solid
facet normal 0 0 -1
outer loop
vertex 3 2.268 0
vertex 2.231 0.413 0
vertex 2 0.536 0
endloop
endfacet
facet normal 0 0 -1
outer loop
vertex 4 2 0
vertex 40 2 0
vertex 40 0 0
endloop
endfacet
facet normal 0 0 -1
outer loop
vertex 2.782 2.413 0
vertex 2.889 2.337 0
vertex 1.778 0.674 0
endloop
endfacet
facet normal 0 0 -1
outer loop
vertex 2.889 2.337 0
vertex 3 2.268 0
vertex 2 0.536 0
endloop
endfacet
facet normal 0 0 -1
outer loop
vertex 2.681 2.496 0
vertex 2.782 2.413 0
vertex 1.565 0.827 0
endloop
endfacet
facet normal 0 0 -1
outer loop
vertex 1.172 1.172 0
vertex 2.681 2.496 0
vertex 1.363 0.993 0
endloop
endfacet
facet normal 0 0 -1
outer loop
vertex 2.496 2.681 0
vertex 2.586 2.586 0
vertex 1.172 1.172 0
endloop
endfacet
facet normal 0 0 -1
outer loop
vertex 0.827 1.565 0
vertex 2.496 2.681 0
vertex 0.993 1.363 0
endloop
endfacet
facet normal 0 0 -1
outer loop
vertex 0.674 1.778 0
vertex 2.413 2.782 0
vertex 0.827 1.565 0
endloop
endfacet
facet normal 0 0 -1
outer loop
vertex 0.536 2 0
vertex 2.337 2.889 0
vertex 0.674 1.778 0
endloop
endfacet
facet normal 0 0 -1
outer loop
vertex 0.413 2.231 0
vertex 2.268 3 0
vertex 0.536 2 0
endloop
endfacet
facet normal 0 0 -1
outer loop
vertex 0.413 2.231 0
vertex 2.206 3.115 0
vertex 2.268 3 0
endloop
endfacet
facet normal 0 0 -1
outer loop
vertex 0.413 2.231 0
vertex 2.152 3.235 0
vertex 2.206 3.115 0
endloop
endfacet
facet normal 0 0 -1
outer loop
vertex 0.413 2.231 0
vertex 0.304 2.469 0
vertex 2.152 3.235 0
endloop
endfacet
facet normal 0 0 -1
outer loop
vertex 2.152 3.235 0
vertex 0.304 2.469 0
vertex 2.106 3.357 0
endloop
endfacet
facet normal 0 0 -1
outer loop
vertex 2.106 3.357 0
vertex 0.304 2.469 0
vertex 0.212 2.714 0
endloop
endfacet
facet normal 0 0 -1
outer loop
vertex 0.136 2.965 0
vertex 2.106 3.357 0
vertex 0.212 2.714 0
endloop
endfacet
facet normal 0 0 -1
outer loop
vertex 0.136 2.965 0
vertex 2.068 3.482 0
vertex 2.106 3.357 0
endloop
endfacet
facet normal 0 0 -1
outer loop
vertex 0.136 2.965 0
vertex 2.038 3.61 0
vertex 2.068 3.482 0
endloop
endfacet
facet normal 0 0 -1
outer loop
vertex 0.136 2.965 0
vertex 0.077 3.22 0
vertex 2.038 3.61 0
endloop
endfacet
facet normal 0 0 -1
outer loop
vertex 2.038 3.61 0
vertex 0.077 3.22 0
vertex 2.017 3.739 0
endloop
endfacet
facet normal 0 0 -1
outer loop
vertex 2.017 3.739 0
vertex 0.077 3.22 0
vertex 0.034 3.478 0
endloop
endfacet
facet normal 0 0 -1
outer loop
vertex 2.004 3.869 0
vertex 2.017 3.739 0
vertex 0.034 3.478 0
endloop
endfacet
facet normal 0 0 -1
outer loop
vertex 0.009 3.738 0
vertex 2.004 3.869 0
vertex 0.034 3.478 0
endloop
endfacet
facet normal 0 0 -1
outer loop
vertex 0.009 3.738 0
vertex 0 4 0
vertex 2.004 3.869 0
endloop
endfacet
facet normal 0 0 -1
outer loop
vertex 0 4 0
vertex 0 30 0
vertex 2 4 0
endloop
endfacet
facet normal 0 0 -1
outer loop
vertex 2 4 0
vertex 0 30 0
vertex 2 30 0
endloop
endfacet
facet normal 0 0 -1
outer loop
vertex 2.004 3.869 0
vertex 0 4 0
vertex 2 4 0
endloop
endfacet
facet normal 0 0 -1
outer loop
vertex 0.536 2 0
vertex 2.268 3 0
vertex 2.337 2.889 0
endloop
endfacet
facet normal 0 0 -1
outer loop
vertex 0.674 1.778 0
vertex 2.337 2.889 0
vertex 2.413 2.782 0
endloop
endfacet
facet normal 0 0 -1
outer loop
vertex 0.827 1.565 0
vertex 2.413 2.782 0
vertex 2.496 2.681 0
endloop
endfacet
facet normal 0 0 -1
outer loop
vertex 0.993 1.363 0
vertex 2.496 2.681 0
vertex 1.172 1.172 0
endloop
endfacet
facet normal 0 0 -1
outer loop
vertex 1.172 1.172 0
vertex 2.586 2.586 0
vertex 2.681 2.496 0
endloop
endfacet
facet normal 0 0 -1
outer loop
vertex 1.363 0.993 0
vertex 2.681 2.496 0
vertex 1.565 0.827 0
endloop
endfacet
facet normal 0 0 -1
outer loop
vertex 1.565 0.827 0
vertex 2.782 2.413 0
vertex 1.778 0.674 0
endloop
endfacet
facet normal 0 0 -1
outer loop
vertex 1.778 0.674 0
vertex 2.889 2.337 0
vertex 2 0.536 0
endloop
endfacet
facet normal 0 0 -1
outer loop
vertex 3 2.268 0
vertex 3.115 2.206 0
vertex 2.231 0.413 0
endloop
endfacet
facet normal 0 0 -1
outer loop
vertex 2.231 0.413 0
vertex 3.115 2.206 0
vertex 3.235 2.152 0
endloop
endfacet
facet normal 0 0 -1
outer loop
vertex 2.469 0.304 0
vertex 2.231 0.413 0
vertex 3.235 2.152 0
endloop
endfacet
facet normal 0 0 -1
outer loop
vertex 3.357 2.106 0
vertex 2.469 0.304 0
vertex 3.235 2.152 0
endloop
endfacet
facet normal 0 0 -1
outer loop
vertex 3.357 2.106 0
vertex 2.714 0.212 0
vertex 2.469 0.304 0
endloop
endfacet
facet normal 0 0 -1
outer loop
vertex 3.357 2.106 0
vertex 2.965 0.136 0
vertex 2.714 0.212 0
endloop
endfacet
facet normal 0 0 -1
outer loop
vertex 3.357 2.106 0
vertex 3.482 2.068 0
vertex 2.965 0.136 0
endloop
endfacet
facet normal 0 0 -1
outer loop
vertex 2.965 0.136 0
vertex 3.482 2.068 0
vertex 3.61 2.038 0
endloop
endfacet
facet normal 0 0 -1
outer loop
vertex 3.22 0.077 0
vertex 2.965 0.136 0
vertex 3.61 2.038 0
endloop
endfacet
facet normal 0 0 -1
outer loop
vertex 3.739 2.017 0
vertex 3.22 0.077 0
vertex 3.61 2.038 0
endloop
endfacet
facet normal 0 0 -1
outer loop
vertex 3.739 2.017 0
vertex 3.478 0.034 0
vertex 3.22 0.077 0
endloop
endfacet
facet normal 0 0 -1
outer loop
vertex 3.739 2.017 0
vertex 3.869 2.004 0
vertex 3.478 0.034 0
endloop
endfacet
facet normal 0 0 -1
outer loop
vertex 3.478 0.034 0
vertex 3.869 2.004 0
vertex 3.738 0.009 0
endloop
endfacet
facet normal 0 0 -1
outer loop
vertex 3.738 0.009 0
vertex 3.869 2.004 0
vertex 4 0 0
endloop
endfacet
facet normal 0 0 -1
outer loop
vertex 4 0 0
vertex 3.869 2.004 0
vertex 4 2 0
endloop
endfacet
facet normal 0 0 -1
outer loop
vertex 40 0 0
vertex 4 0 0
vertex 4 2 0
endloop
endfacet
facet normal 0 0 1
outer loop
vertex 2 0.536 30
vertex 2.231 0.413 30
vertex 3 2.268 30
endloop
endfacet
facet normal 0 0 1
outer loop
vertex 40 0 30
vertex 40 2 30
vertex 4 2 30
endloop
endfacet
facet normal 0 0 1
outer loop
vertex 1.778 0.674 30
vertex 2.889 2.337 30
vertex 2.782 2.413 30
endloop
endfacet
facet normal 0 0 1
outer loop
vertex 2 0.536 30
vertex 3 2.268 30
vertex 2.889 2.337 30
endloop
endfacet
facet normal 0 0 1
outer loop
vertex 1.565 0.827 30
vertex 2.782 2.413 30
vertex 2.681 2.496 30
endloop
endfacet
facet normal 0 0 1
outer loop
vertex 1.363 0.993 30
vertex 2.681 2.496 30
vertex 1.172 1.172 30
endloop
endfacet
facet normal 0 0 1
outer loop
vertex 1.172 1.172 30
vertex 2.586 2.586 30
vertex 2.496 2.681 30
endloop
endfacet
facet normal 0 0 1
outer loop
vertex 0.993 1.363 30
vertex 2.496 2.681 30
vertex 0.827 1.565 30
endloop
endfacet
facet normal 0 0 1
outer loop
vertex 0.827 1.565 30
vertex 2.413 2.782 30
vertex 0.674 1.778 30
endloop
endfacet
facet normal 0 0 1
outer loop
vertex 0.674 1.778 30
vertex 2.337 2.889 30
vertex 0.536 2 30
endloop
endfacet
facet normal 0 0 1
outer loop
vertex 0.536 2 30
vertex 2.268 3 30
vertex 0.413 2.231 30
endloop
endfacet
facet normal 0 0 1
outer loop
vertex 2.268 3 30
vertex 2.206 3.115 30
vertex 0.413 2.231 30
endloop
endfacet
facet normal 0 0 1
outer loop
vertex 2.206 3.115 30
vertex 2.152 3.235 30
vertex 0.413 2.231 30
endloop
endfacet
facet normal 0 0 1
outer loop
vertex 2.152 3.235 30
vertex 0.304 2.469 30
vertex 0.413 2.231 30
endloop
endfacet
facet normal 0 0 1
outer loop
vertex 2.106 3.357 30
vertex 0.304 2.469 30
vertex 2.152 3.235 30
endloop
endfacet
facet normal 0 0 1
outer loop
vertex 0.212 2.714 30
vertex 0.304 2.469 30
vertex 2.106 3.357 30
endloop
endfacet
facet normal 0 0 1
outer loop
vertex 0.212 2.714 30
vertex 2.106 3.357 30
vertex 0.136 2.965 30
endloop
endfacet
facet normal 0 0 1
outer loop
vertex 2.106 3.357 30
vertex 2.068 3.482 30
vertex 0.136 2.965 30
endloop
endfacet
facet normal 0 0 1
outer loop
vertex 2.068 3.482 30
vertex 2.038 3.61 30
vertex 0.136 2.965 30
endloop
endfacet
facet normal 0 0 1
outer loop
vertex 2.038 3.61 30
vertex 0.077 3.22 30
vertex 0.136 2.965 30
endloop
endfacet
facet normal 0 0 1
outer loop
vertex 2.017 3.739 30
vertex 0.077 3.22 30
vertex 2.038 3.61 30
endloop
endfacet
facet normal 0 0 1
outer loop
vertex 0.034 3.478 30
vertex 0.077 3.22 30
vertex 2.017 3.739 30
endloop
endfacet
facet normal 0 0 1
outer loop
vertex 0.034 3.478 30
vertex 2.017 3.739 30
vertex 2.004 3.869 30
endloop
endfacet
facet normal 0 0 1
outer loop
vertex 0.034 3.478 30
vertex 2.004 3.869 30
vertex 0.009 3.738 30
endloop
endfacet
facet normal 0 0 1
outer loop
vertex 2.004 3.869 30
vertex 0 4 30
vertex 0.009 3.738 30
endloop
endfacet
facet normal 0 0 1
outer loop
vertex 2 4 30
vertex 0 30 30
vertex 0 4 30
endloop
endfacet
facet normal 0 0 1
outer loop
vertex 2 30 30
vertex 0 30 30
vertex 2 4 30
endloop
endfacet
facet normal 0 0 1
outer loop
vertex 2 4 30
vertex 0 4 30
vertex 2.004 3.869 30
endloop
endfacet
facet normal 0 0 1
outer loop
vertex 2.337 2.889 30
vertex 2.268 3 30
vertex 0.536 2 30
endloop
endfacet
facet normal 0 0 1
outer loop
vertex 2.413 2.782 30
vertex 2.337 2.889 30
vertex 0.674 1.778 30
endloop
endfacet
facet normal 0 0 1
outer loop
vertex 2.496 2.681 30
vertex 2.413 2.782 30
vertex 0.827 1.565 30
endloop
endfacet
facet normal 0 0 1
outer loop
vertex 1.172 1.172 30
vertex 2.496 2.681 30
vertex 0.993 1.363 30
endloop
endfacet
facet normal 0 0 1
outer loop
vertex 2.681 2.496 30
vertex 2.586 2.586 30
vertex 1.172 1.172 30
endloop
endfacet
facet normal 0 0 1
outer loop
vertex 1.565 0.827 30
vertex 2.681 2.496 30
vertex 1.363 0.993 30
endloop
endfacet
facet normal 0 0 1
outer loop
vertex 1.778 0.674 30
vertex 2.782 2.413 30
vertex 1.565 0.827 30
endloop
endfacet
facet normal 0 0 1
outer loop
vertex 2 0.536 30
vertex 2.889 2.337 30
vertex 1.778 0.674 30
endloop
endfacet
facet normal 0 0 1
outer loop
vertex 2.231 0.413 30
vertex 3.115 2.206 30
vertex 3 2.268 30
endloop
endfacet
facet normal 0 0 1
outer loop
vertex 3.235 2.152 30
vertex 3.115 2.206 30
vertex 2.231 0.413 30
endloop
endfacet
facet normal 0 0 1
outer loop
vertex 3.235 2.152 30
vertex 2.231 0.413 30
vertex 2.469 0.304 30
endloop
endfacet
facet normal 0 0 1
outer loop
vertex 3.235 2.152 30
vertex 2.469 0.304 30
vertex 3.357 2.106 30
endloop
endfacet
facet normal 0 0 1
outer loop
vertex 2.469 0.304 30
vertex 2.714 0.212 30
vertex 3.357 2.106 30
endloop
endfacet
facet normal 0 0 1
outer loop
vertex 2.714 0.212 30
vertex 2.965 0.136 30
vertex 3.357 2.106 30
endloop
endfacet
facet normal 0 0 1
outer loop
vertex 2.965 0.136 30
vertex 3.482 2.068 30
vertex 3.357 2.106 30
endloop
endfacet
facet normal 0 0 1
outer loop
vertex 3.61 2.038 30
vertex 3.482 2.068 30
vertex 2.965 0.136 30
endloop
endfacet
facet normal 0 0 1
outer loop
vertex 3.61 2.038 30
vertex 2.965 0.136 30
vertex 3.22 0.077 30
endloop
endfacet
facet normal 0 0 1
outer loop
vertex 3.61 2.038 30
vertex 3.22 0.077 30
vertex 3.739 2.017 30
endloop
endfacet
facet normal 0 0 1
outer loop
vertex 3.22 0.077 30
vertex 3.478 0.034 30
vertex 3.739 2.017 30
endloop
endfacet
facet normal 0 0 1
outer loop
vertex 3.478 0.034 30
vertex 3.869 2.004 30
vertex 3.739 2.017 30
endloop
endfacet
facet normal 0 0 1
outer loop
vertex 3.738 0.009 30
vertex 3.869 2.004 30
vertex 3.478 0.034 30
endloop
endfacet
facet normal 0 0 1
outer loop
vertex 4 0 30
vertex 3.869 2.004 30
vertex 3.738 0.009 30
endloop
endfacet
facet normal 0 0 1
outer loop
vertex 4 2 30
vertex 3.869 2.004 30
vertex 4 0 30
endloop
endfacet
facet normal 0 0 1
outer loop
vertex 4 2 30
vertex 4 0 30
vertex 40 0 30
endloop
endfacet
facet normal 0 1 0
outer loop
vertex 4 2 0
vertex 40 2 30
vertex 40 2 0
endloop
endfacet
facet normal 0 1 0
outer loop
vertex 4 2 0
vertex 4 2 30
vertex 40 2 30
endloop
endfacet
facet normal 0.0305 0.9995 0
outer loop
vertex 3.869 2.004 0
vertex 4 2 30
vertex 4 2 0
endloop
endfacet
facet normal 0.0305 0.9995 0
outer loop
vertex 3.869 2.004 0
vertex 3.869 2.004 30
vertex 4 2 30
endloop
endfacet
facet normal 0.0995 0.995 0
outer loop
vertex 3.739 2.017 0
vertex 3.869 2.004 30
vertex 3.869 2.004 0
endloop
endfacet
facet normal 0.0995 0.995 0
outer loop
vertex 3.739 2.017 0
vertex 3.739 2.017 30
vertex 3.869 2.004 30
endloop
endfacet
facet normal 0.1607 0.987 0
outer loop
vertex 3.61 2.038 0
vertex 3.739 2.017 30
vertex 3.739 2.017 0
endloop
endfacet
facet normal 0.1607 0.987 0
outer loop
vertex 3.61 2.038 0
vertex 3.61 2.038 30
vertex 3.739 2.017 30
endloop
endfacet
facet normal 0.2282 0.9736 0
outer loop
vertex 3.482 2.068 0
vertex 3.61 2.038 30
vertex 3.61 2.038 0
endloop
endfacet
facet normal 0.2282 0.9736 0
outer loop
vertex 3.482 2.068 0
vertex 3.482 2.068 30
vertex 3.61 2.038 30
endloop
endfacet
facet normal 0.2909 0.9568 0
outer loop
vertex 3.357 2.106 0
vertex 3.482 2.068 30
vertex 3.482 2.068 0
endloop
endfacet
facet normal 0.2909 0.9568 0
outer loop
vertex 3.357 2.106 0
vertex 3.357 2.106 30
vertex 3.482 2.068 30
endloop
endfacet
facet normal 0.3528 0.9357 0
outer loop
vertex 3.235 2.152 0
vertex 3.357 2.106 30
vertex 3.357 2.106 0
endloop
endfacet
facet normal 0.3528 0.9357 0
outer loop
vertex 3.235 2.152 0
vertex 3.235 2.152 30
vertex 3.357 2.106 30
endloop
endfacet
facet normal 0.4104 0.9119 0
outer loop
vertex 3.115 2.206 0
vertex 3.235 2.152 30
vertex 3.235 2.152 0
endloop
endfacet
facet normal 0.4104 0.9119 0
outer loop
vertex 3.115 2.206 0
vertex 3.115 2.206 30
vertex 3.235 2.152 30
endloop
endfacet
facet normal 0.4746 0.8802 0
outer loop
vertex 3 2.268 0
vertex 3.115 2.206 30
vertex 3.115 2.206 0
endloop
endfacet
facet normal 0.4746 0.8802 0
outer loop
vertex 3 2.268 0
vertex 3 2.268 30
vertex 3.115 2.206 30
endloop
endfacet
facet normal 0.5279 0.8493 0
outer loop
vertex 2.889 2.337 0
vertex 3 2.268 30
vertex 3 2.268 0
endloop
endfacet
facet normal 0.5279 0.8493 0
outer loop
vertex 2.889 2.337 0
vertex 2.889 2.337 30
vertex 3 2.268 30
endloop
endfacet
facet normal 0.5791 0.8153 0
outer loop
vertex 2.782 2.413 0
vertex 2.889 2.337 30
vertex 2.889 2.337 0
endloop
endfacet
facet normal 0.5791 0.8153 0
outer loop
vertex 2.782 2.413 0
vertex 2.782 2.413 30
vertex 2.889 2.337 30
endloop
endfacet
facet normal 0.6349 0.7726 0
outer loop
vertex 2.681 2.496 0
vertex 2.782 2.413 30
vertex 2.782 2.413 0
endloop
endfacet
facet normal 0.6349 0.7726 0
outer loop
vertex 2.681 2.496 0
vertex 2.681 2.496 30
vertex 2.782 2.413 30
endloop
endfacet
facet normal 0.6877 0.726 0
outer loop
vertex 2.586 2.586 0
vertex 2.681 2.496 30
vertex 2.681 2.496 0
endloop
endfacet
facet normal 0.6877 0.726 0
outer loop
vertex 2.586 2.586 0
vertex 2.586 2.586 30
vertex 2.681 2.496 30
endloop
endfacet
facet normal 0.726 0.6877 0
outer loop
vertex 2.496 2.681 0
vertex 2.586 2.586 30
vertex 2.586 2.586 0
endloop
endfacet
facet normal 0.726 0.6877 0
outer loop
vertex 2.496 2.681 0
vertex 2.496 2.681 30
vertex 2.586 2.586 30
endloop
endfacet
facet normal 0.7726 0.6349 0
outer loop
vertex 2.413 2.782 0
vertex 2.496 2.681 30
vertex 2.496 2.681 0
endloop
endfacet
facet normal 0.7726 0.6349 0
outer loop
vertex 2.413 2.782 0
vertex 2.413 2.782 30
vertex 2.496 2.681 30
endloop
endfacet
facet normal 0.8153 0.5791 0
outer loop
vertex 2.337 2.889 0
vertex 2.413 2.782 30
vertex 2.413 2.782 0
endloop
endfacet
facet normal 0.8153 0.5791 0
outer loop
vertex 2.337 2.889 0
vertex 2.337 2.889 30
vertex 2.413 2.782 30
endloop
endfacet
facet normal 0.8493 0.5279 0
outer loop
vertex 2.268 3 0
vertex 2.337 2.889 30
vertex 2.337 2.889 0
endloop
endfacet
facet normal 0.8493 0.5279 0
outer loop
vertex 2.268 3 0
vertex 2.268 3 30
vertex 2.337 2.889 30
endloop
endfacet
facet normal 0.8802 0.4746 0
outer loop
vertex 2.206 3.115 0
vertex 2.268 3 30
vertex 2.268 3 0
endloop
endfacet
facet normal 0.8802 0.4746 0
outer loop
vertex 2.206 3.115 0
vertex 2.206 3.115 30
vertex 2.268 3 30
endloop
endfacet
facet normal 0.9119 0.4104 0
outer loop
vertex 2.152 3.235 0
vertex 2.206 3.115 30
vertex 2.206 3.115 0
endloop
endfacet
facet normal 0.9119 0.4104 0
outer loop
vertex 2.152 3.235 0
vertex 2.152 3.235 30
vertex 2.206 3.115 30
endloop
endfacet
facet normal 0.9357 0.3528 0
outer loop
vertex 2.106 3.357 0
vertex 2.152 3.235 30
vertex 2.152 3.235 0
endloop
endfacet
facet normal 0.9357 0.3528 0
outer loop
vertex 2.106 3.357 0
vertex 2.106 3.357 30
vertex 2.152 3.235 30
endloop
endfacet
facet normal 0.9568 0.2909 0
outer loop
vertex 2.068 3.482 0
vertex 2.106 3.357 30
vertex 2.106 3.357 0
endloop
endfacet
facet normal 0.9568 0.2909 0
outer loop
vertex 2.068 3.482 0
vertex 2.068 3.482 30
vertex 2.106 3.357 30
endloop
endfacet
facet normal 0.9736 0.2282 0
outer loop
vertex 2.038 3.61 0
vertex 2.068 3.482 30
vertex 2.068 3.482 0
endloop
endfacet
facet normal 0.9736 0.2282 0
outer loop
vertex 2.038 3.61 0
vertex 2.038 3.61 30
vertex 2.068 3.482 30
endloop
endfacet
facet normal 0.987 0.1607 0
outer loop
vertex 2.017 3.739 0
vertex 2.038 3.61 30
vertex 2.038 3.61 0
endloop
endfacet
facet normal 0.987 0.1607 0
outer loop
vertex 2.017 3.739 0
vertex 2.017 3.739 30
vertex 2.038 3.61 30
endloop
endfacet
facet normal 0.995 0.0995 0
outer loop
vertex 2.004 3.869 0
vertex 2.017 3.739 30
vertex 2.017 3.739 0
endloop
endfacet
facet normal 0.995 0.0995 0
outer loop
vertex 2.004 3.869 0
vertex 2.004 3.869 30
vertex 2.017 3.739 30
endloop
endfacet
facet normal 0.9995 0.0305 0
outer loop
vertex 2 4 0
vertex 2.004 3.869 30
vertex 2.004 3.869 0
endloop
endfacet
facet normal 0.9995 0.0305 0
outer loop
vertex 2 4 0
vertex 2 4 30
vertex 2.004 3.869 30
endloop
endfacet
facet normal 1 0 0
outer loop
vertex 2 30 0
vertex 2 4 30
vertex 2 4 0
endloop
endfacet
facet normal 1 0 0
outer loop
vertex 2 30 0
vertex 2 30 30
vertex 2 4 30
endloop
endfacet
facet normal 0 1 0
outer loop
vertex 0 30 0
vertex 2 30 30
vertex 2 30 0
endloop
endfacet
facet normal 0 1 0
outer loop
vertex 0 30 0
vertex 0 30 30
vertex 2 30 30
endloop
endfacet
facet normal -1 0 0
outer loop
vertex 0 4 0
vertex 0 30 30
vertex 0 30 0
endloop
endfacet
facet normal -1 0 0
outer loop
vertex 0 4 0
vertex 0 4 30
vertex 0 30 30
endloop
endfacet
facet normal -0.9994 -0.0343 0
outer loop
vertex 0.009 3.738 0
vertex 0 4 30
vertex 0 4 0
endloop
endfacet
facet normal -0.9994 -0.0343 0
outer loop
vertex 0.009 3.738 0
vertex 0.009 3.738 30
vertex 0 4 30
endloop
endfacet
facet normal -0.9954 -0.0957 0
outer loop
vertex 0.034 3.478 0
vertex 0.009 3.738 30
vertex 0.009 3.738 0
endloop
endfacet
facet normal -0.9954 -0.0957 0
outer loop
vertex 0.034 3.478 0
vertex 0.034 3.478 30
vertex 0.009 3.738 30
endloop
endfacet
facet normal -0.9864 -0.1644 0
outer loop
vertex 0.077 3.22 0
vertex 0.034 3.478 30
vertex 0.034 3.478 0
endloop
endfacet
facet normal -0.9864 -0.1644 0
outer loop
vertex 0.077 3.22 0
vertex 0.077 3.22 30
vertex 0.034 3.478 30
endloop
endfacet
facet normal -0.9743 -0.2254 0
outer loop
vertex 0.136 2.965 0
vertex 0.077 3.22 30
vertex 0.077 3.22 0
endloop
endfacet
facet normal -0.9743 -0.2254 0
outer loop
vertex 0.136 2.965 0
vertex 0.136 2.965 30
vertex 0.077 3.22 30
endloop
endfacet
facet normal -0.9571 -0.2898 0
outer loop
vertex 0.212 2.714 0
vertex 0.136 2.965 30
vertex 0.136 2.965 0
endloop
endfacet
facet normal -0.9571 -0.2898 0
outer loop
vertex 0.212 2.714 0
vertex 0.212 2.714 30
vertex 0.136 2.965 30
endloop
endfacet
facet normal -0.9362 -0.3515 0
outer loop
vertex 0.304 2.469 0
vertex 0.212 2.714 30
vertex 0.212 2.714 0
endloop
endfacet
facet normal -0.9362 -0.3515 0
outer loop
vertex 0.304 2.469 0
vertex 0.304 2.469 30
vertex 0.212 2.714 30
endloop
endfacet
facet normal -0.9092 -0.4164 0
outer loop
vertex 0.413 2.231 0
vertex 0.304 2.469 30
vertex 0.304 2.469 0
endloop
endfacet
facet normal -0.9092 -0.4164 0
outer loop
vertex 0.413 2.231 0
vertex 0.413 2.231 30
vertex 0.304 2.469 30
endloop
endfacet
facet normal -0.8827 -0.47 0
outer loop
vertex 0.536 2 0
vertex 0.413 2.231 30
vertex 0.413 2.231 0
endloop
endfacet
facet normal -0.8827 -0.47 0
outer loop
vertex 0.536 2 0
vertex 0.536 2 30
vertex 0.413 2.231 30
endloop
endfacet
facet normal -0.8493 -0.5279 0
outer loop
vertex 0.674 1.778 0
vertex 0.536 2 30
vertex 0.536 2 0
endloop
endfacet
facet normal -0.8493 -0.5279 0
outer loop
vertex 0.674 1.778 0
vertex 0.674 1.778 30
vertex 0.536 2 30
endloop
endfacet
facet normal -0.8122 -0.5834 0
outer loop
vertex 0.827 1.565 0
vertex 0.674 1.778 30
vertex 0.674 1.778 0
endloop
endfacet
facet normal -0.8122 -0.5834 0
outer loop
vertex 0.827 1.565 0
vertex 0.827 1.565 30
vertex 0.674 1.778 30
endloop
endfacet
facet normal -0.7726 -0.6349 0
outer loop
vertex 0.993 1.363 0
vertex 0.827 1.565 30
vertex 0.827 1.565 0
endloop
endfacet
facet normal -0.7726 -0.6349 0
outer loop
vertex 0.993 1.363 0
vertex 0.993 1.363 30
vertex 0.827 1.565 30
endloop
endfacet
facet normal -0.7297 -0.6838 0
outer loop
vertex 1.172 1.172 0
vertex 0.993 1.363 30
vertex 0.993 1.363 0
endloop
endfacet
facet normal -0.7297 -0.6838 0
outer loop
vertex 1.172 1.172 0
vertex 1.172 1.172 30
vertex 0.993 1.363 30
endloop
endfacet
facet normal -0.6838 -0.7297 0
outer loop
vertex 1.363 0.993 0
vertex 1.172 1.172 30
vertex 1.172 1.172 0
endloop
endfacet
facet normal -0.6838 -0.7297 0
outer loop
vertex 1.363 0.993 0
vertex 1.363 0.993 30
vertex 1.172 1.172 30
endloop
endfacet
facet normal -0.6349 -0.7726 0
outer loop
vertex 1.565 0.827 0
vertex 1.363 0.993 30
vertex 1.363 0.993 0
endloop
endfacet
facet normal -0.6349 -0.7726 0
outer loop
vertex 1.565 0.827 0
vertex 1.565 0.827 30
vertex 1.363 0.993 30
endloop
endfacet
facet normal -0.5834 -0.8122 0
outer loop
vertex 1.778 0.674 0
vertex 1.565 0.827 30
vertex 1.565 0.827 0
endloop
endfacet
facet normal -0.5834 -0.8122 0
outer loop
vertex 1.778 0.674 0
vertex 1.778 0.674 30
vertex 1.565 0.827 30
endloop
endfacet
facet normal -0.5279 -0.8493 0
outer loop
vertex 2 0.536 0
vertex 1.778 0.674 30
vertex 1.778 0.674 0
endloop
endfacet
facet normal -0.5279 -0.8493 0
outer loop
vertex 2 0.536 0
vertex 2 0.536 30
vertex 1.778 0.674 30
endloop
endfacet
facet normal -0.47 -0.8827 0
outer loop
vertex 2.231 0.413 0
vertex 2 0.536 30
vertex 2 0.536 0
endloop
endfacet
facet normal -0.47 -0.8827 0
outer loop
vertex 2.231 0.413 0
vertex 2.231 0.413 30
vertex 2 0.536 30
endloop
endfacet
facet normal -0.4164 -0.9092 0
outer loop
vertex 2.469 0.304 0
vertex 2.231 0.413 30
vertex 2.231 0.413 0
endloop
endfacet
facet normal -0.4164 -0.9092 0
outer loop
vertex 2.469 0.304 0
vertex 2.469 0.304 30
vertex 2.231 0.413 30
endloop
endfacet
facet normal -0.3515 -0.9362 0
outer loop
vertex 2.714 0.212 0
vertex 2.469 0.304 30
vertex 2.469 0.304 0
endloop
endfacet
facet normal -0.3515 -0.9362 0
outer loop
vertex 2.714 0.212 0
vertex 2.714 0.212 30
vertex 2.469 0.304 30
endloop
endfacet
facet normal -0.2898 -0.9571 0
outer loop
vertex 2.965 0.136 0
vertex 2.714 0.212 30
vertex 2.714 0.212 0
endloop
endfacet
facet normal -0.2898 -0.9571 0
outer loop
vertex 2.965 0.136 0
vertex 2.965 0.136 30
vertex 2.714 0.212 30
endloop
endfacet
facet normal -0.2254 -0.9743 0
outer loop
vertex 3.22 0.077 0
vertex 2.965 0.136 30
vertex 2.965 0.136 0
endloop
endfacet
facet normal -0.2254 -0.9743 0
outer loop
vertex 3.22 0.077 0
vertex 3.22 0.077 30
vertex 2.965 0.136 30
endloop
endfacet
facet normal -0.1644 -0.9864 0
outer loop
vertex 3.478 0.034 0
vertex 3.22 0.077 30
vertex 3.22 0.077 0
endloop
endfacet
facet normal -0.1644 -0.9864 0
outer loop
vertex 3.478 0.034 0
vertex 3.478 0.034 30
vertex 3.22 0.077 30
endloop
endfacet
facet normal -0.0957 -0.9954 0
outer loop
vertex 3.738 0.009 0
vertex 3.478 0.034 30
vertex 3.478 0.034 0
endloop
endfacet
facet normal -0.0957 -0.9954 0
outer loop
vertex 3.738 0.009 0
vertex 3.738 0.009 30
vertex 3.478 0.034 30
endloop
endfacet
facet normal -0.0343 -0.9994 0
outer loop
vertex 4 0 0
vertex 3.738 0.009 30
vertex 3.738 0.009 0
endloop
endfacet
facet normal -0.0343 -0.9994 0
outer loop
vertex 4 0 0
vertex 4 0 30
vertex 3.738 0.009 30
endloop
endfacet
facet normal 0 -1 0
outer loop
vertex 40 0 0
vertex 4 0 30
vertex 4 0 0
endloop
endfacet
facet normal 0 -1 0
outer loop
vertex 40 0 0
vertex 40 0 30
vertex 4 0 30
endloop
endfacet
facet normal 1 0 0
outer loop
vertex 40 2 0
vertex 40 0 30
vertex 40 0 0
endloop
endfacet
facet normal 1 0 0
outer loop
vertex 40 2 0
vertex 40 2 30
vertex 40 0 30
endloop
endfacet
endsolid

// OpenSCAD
thickness_mm = 2.0;
bend_radius_mm = 2.0;
k_factor = 0.45;
bend_angle_deg = 90;
flange_a_outside_mm = 40.0;
flange_b_outside_mm = 30.0;
bracket_width_mm = 30.0;

outer_radius_mm = bend_radius_mm + thickness_mm;
bend_allowance_mm = (bend_angle_deg * PI / 180) * (bend_radius_mm + k_factor * thickness_mm);
outside_setback_mm = outer_radius_mm * tan(bend_angle_deg / 2);
bend_deduction_mm = 2 * outside_setback_mm - bend_allowance_mm;
flat_length_mm = flange_a_outside_mm + flange_b_outside_mm - bend_deduction_mm;

echo(str(
    "MAKERBENCH-SHEETMETAL: {\"thickness_mm\": ",
    thickness_mm,
    ", \"bend_radius_mm\": ",
    bend_radius_mm,
    ", \"flat_length_mm\": ",
    flat_length_mm,
    "}"
));

$fn = 64;

function arc_points(cx, cy, r, a0, a1, n) =
    [for (i = [0:n])
        let(a = a0 + (a1 - a0) * i / n)
        [cx + r * cos(a), cy + r * sin(a)]
    ];

module sheet_metal_l_bracket() {
    cx = outer_radius_mm;
    cy = outer_radius_mm;
    arc_segments = 24;

    outer_arc = arc_points(cx, cy, outer_radius_mm, -90, -180, arc_segments);
    inner_arc = arc_points(cx, cy, bend_radius_mm, 180, 270, arc_segments);

    cross_section = concat(
        [[flange_a_outside_mm, 0]],
        outer_arc,
        [[0, flange_b_outside_mm],
         [thickness_mm, flange_b_outside_mm],
         [thickness_mm, outer_radius_mm]],
        inner_arc,
        [[flange_a_outside_mm, thickness_mm]]
    );

    linear_extrude(height = bracket_width_mm, convexity = 4)
        polygon(points = cross_section);
}

sheet_metal_l_bracket();
